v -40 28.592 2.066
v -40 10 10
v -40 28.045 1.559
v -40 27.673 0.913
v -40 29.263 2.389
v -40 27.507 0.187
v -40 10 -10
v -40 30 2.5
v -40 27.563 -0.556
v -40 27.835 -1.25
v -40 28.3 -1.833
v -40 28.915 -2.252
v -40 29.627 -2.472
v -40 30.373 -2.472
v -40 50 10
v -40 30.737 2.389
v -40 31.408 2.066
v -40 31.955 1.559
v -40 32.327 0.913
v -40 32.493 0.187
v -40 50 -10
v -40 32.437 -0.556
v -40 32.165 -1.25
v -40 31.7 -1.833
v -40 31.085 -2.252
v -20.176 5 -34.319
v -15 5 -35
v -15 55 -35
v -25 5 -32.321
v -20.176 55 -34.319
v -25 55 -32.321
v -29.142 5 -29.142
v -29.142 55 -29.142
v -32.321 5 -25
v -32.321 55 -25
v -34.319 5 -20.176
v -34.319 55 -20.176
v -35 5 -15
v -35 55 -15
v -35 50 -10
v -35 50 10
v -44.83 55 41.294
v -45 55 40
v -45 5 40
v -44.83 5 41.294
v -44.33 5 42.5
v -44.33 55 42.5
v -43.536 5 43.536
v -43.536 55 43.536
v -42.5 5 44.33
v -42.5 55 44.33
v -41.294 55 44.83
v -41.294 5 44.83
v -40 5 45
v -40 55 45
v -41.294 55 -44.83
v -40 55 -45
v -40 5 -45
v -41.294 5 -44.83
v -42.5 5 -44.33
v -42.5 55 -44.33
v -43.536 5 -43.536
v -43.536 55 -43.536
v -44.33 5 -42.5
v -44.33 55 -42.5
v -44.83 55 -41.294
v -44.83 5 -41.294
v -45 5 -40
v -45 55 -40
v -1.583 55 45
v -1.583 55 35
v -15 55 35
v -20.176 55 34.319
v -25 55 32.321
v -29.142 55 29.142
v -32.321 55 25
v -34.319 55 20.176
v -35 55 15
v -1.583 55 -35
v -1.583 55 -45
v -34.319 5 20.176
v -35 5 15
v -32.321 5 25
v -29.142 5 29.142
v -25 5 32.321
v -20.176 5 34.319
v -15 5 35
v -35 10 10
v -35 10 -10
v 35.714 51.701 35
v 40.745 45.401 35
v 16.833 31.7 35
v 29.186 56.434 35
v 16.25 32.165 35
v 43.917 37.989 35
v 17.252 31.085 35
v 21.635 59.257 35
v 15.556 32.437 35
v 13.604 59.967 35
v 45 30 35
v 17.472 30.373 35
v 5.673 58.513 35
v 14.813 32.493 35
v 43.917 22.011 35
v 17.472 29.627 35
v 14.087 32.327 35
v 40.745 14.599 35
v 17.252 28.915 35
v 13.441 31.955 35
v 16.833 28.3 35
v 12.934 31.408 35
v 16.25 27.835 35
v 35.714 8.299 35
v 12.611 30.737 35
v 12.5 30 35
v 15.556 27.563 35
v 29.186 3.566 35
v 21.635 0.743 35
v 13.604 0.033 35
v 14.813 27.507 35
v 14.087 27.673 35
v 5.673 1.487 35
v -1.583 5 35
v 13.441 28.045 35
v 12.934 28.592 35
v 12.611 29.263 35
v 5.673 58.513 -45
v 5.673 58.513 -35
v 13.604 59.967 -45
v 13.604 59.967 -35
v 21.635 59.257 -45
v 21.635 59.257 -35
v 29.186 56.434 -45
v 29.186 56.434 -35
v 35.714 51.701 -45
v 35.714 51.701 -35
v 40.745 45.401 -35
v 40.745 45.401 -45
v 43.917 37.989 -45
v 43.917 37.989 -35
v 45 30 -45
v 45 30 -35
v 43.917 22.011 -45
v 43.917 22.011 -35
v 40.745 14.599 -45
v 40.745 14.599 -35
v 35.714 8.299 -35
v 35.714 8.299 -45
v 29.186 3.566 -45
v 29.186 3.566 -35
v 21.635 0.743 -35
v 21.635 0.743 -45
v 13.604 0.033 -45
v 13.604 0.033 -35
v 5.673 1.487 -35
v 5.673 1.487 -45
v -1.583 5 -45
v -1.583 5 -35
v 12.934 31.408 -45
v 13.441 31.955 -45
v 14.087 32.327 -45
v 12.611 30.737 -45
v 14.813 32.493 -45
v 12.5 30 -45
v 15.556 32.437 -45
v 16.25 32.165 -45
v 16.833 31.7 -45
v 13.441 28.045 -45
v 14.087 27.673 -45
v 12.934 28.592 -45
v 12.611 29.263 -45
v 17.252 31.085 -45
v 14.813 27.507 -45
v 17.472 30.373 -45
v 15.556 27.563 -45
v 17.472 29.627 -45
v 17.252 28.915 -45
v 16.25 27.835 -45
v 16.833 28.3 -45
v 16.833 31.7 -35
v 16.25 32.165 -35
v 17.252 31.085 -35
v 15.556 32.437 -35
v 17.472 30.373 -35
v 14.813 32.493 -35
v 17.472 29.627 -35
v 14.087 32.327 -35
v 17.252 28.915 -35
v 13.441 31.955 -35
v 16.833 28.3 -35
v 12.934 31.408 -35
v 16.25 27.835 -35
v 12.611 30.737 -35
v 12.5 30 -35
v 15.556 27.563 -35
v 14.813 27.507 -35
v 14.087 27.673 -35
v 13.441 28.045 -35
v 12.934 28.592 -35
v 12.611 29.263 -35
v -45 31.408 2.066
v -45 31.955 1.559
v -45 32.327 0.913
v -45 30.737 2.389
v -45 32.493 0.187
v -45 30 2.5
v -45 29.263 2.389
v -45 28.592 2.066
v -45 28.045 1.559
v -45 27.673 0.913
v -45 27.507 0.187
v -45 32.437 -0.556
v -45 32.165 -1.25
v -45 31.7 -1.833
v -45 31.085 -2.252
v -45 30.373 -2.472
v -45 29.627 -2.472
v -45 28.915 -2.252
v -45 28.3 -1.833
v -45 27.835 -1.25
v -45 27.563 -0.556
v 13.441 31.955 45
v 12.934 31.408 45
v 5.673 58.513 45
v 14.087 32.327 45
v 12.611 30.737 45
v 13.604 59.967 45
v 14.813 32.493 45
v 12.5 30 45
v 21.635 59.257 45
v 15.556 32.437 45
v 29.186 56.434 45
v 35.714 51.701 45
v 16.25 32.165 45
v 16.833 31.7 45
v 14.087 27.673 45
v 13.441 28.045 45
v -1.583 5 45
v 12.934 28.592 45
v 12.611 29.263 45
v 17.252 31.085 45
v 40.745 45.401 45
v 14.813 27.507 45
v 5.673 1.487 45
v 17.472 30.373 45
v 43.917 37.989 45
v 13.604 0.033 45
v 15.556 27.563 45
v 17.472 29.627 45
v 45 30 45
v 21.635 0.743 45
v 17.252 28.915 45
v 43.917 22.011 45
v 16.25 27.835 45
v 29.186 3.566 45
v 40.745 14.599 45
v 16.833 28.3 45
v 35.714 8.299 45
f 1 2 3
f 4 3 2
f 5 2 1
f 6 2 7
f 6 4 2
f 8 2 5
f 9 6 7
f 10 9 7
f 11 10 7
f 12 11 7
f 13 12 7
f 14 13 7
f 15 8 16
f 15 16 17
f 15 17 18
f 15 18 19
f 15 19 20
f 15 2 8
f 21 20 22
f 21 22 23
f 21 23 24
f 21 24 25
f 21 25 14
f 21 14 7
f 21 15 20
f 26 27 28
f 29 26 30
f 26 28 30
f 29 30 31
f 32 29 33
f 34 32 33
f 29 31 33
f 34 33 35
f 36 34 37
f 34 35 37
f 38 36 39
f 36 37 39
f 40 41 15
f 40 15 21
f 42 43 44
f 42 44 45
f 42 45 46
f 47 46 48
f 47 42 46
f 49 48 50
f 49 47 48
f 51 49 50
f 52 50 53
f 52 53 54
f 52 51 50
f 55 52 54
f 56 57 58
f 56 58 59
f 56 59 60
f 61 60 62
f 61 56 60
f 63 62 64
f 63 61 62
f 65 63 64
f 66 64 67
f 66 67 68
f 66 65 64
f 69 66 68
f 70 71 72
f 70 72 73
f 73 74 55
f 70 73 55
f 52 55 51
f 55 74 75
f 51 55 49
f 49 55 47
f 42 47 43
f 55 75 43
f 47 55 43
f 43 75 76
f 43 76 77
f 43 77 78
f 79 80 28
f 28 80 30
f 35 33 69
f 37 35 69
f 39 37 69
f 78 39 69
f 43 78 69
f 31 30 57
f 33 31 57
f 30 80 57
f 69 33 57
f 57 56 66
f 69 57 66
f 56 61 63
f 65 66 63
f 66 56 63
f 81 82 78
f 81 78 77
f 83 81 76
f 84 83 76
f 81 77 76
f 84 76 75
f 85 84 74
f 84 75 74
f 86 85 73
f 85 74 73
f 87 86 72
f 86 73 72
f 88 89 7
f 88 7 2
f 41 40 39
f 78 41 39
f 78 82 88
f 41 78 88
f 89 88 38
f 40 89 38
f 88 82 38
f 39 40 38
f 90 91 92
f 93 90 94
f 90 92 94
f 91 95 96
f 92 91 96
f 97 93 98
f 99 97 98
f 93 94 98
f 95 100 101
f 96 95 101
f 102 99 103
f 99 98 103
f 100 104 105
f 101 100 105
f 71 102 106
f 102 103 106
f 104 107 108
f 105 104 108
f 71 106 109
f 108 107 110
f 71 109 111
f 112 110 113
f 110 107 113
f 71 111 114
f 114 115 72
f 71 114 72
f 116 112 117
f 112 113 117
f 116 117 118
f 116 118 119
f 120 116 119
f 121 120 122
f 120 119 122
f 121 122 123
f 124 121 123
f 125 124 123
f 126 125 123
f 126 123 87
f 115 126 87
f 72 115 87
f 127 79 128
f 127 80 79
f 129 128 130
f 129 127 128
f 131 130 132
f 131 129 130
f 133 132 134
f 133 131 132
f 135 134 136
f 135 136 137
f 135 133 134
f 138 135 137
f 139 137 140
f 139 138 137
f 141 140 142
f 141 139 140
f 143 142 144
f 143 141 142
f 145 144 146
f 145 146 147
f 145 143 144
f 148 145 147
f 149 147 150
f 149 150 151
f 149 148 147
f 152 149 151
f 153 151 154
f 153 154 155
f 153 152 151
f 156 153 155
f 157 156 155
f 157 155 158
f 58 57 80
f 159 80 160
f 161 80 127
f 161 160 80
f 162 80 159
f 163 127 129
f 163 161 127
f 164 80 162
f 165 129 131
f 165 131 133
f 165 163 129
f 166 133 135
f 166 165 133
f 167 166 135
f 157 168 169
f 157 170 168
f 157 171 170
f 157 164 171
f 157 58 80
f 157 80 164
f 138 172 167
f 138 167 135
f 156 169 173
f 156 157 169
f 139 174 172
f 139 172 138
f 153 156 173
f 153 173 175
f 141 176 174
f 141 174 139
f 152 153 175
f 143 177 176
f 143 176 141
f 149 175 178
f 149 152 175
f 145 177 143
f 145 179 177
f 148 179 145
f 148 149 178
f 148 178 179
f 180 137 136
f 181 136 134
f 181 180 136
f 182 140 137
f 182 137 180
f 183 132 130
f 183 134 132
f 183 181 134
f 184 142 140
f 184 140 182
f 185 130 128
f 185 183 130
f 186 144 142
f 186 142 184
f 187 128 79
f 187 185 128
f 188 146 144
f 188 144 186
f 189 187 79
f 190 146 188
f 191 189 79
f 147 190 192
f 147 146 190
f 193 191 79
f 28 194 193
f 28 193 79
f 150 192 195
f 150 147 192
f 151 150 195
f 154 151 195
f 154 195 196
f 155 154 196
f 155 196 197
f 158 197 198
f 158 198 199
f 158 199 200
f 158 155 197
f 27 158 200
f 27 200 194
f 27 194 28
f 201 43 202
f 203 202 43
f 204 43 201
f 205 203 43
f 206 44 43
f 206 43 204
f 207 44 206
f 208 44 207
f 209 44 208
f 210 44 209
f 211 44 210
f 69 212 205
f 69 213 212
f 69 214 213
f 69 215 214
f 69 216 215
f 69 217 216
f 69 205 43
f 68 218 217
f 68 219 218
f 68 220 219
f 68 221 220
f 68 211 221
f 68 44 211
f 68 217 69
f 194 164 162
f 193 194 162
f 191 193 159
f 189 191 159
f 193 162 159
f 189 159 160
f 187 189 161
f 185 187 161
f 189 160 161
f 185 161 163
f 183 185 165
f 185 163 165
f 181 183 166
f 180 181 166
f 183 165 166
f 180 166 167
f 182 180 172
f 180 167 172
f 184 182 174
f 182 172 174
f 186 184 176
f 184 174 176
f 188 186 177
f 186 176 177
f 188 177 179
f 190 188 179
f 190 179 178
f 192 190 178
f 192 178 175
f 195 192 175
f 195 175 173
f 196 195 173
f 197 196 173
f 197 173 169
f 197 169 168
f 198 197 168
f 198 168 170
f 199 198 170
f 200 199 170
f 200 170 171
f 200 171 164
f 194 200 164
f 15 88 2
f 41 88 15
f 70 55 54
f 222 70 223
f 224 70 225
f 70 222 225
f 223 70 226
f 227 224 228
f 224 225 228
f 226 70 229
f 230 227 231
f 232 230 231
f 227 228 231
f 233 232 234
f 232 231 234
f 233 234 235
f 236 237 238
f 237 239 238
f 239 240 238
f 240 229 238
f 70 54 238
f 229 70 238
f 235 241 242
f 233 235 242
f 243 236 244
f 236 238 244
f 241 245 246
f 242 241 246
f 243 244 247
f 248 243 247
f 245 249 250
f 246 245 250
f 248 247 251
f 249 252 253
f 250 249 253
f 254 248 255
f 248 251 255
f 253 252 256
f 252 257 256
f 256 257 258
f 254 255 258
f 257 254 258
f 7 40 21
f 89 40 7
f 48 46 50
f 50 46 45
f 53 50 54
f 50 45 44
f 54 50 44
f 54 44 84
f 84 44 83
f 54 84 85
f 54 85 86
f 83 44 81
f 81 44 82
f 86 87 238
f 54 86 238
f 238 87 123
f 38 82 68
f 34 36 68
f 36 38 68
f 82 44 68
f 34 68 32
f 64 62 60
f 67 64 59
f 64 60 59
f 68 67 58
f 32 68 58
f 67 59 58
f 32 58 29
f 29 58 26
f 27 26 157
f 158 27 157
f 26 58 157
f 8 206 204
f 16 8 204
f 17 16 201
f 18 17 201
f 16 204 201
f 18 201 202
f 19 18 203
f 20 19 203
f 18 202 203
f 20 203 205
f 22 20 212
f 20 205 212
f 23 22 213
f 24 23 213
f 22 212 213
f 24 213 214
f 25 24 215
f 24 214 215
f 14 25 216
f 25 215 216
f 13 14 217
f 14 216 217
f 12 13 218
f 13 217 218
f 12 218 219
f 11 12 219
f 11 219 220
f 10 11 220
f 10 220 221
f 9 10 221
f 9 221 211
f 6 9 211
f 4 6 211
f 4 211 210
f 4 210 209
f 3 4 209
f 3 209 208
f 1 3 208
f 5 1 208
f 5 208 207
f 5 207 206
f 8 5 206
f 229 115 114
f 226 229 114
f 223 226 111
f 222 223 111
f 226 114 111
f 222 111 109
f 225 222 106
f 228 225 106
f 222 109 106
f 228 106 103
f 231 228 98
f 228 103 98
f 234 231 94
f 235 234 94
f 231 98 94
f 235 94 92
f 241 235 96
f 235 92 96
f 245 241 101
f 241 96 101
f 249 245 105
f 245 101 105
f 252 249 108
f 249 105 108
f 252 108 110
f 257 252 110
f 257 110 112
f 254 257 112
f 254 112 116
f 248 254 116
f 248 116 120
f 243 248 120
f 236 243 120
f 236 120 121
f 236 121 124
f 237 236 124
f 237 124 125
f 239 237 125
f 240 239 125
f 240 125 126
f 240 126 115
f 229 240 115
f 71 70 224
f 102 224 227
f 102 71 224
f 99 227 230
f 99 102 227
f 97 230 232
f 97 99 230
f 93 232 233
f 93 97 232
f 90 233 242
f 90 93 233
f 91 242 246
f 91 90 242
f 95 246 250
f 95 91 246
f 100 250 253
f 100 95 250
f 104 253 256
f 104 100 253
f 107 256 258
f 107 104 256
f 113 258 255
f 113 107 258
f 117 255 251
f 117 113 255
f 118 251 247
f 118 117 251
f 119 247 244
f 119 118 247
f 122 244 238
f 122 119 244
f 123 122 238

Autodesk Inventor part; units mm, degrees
ref_plane "YZ Plane" through (0, 0, 0) normal (1, 0, 0) x (0, 1, 0)
ref_plane "XZ Plane" through (0, 0, 0) normal (0, 1, 0) x (-1, 0, 0)
ref_plane "XY Plane" through (0, 0, 0) normal (0, 0, 1) x (1, 0, 0)
sketch "Sketch1" plane through (0, 0, 0) normal (0, 1, 0) x (-1, 0, 0)
  line L0 (45, 0) -> (45, -45)
  line L1 (45, -45) -> (0, -45)
  line L2 (-45, 0) -> (-45, -45)
  line L3 (-45, -45) -> (0, -45)
  line L4 (45, 0) -> (45, 45)
  line L5 (45, 45) -> (0, 45)
  line L6 (-45, 0) -> (-45, 45)
  line L7 (-45, 45) -> (0, 45)
  line L8 (-45, 45) -> (-45, 35)
  line L9 (-45, 35) -> (51.6203, 35)
  line L10 (-45, -45) -> (-45, -35)
  line L11 (-45, -35) -> (58.872, -35)
  line L12 (45, 45) -> (35, 45)
  line L13 (35, 45) -> (35, -45)
  point P0 (0, 0)
  point P1 (35, 35)
  point P2 (35, -35)
  dimension "d0" = 45
  dimension "d1" = 45
  dimension "d2" = 10
  dimension "d3" = 10
  dimension "d4" = 10
extrude "Extrusion1" add sketch "Sketch1" along normal blind 60 contours L0 L11 L13 L9 L4 | L0 L1 L13 L11 | L9 L13 L5 L4 | L13 L1 L3 L2 L11 | L9 L6 L7 L5 L13
fillet "Fillet1" radius 20 2 edges at (-35, 30, 35) (-35, 30, -35)
fillet "Fillet2" radius 5 2 edges at (-45, 30, 45) (-45, 30, -45)
sketch "Sketch2" plane through (45, 0, -45) normal (0, 0, -1) x (-1, 0, 0)
  line L0 (0, 0) -> (0, 60) projected
  arc A0 (46.5831, 55) -> (46.5831, 5) centre (30, 30) ccw
  line L1 (90, 5) -> (46.5831, 5)
  line L2 (46.5831, 55) -> (90, 55)
  line L3 (90, 60) -> (90, 0) projected
  line L4 (60, 0) -> (0, 0) projected
  line L5 (90, 60) -> (0, 60)
  line L6 (0, 60) -> (0, 0)
  line L7 (0, 0) -> (90, 0)
  line L8 (90, 0) -> (90, 60)
  point P0 (45, 0)
  point P1 (30, 60)
  point P2 (30, 0)
  point P3 (0, 30)
  dimension "d10" = 5
extrude "Extrusion2" cut sketch "Sketch2" against normal blind 161.25 contours L0 A0 L4 | L0 L5 A0 | A0 L1 L3 L7 L4 | L5 L3 L2 A0
sketch "Sketch3" plane through (-1.5831, 5, -45) normal (0, 0, -1) x (-1, 0, 0)
  line L0 (13.4169, 50) -> (0, 50) projected
  arc A0 (0, 50) -> (0, 0) centre (-16.5831, 25) ccw projected
  circle A1 centre (-16.5831, 25) radius 2.5
  point P0 (-1.5831, -5)
  dimension "d15" = 5
extrude "Extrusion3" cut sketch "Sketch3" against normal blind 161.25
sketch "Sketch4" plane through (-45, 5, 40) normal (-1, 0, 0) x (0, 0, 1)
  circle A0 centre (-40, 25) radius 2.5
  point P0 (-40, -5)
  dimension "d18" = 5
extrude "Extrusion4" cut sketch "Sketch4" against normal blind 161.25
sketch "Sketch5" plane through (-45, 5, 40) normal (-1, 0, 0) x (0, 0, 1)
  point P0 (-40, -5)
sketch "Sketch6" plane through (-35, 5, -15) normal (1, 0, 0) x (0, 0, -1)
  line L0 (-15, 45) -> (-5, 45)
  line L1 (-5, 45) -> (-5, 5)
  line L2 (-5, 5) -> (-25, 5)
  line L3 (-25, 5) -> (-25, 45)
  line L4 (-25, 45) -> (-15, 45)
  point P0 (-15, -5)
  point P1 (-15, 25)
  dimension "d21" = 20
  dimension "d22" = 10
  dimension "d23" = 40
  dimension "d24" = 20
  dimension "d25" = 40
  dimension "d26" = 90
extrude "Extrusion5" cut sketch "Sketch6" against normal blind 5
properties part number "PartArm1"
